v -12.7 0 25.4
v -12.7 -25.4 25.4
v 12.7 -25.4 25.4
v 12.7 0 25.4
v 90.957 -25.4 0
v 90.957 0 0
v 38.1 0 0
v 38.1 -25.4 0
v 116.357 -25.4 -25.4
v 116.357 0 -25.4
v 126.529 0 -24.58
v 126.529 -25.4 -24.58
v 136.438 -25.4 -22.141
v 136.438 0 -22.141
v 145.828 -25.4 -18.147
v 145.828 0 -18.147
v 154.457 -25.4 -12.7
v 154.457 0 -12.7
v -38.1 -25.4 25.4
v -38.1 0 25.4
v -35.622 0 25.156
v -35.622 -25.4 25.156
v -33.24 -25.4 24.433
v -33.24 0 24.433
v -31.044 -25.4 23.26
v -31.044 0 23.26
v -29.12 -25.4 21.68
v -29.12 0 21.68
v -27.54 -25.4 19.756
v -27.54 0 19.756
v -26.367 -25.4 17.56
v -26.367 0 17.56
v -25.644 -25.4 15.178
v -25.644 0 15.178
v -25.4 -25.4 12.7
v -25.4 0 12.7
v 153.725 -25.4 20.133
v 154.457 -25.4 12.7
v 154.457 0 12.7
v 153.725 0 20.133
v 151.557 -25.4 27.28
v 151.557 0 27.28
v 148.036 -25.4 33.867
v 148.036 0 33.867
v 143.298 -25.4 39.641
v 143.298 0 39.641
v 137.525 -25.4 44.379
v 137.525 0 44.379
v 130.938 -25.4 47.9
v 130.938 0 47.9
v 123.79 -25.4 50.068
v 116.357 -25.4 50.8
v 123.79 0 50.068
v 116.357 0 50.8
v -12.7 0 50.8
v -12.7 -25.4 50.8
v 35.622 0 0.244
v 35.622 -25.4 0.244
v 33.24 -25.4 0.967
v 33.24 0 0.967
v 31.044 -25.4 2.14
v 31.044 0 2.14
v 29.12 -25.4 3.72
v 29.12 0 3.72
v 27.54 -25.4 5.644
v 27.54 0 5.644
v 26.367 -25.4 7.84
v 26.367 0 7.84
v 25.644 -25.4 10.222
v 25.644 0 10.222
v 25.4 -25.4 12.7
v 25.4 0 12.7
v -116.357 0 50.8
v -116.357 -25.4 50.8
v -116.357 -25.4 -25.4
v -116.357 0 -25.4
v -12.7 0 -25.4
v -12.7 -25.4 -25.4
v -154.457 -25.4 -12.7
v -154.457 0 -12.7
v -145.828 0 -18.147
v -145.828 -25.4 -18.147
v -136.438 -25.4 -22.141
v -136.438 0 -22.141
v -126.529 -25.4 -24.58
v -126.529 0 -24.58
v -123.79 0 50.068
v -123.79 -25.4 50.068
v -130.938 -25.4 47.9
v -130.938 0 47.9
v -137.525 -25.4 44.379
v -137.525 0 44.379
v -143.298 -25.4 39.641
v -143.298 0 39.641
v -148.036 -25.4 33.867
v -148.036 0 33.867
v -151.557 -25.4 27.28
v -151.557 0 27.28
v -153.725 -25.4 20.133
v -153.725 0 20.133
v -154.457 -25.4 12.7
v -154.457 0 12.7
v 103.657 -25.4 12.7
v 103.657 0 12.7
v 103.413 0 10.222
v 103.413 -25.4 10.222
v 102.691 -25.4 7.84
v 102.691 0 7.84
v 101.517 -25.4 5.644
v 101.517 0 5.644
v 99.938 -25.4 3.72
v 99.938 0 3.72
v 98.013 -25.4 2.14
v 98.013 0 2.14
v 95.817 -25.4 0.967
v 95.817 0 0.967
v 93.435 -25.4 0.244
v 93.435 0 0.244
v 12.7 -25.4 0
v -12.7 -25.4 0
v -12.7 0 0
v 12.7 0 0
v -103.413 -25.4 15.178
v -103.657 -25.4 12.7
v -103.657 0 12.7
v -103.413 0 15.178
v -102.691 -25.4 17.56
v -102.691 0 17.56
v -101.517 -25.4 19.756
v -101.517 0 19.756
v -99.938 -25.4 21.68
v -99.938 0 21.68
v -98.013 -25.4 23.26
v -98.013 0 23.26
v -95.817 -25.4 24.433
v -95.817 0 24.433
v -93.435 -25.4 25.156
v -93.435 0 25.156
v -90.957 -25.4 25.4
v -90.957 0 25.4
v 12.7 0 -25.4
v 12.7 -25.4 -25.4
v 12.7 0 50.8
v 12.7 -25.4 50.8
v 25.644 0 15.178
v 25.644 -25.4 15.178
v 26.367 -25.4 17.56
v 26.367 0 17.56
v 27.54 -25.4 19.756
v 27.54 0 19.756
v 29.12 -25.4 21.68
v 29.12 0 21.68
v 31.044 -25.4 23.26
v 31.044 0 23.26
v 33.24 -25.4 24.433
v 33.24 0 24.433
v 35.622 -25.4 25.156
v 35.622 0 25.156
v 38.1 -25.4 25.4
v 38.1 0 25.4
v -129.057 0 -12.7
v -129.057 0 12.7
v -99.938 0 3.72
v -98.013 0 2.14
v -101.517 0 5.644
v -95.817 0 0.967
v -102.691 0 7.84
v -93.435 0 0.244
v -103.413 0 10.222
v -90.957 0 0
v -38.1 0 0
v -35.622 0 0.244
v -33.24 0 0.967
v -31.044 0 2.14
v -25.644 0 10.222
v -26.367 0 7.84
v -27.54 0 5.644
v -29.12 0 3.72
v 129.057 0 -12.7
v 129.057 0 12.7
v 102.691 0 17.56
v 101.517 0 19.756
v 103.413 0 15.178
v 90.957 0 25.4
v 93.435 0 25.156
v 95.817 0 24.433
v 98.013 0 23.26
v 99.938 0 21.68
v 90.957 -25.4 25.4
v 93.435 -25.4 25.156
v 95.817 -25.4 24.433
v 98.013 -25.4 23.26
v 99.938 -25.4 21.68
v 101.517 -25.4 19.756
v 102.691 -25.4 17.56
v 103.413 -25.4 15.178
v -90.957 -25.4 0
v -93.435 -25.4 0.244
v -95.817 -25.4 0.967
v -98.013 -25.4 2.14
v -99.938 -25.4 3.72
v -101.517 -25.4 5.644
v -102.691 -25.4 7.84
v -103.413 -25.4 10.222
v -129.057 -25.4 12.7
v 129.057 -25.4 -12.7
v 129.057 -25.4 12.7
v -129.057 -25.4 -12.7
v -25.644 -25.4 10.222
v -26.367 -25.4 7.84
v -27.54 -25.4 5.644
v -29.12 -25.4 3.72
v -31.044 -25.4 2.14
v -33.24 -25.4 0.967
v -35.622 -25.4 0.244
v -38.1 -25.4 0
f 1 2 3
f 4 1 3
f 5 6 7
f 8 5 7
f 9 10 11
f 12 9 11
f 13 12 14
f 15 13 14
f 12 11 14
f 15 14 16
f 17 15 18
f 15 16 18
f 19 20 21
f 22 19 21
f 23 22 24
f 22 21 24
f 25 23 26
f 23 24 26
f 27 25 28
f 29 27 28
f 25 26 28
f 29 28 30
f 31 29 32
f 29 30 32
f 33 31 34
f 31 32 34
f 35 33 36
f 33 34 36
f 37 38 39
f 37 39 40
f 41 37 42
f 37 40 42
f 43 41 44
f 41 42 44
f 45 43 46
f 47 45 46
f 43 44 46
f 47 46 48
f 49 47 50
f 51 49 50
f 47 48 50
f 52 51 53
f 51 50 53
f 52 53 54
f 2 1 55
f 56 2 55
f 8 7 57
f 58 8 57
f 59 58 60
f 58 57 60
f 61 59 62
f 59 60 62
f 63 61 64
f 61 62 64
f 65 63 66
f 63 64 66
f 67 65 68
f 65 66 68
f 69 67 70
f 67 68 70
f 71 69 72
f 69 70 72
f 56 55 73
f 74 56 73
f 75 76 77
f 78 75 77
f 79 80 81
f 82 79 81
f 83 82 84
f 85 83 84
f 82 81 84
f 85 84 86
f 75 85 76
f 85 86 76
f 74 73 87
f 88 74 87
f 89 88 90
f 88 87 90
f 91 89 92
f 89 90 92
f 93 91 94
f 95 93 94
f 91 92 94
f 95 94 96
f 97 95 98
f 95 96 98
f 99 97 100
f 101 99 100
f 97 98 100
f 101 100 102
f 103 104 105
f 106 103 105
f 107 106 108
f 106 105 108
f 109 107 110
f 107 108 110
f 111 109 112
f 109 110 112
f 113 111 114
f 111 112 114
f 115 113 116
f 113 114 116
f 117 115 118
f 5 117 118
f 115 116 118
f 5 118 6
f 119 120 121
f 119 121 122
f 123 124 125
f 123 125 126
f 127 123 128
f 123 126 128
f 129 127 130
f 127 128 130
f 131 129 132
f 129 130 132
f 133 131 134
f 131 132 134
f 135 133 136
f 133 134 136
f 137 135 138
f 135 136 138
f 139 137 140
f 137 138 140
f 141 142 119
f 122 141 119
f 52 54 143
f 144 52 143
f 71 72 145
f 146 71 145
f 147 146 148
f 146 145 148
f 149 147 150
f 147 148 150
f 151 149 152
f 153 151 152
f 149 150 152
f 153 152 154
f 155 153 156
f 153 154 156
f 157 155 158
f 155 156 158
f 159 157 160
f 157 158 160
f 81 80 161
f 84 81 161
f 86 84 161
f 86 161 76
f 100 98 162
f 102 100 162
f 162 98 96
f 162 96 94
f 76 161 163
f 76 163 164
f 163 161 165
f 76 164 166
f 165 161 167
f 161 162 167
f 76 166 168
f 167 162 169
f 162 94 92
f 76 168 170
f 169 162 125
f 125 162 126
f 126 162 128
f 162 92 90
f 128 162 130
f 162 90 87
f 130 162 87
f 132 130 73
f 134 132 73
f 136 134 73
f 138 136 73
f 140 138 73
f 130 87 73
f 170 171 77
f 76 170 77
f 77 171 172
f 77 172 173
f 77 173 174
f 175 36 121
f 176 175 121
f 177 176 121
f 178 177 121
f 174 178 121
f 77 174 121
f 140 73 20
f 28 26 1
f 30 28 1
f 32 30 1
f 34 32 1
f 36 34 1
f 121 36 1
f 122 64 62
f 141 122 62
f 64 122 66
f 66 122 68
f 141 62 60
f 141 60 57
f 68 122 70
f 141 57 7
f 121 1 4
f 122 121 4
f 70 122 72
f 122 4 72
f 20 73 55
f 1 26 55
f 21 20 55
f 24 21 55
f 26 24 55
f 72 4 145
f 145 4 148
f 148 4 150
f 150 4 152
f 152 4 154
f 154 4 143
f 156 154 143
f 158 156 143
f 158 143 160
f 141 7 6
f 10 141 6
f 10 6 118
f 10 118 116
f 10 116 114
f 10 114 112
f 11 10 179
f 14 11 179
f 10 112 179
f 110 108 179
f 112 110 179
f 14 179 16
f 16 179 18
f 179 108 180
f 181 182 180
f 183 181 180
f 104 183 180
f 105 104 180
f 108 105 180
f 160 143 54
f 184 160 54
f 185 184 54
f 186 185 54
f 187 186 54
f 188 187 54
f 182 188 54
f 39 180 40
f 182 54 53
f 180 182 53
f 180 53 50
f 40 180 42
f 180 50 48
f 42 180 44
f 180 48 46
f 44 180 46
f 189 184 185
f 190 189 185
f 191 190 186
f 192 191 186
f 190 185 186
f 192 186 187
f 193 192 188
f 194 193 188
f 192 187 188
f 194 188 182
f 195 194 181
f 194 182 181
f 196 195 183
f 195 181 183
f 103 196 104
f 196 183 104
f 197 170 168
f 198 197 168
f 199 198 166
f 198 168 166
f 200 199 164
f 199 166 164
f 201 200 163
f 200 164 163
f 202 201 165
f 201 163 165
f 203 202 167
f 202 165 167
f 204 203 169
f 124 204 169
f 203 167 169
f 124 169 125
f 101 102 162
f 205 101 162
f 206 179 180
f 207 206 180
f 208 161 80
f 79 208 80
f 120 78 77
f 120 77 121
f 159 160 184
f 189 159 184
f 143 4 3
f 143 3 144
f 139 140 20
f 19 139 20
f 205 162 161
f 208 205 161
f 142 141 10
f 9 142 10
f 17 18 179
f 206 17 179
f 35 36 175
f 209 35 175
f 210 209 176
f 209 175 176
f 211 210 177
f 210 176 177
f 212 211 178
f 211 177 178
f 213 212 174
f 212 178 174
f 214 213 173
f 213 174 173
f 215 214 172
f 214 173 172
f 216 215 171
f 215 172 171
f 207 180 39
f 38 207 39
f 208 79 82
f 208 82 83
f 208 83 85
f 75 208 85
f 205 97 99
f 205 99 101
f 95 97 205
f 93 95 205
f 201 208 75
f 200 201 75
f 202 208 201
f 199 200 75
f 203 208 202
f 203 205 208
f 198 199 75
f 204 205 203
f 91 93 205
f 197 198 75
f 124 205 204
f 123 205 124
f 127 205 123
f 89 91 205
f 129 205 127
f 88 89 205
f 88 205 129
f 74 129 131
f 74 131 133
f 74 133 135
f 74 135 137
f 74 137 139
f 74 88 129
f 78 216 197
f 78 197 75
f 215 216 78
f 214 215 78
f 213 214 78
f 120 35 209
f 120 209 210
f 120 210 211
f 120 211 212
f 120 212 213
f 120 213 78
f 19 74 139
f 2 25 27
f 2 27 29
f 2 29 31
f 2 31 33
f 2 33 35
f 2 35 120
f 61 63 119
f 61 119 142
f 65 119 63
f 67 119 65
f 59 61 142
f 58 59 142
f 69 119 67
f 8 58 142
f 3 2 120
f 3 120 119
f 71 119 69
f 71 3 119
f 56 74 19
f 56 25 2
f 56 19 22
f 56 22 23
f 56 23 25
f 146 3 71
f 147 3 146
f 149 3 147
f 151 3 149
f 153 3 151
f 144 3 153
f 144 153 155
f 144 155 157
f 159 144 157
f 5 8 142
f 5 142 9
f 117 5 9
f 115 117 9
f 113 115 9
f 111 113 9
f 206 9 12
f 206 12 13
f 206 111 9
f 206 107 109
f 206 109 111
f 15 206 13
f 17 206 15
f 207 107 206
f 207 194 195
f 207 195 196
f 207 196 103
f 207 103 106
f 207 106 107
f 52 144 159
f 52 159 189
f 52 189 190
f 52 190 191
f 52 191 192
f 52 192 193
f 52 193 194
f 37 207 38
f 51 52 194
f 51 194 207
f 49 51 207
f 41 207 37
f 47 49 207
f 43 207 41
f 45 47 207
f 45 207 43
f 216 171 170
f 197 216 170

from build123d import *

# Parameters (mm, degrees)
F1_DEPTH = 25.4
F2_W     = 25.4
F2_H     = 25.4
F3_DEPTH = 25.4


with BuildPart() as f1:
    # F0 (on Front) → F1 (new body)
    with BuildSketch(Plane.XZ):
        with BuildLine():
            Line((-154.4574, 12.7), (-129.0574, 12.7))
            Line((-129.0574, 12.7), (-129.0574, -12.7))
            Line((-129.0574, -12.7), (-154.4574, -12.7))
            ThreePointArc((-154.4574, -12.7), (-136.437863, -22.141389), (-116.3574, -25.4))
            Line((-116.3574, -25.4), (0, -25.4))
            Line((0, -25.4), (116.3574, -25.4))
            ThreePointArc((116.3574, -25.4), (136.437863, -22.141389), (154.4574, -12.7))
            Line((154.4574, -12.7), (129.0574, -12.7))
            Line((129.0574, -12.7), (129.0574, 12.7))
            Line((129.0574, 12.7), (154.4574, 12.7))
            ThreePointArc((154.4574, 12.7), (143.298168, 39.640768), (116.3574, 50.8))
            Line((116.3574, 50.8), (0, 50.8))
            Line((0, 50.8), (-116.3574, 50.8))
            ThreePointArc((-116.3574, 50.8), (-143.298168, 39.640768), (-154.4574, 12.7))
        make_face()
        with BuildLine():
            ThreePointArc((-103.6574, 12.7), (-99.937656, 21.680256), (-90.9574, 25.4))
            Line((-90.9574, 25.4), (-38.1, 25.4))
            ThreePointArc((-38.1, 25.4), (-29.119744, 21.680256), (-25.4, 12.7))
            ThreePointArc((-25.4, 12.7), (-29.119744, 3.719744), (-38.1, 0))
            Line((-38.1, 0), (-90.9574, 0))
            ThreePointArc((-90.9574, 0), (-99.937656, 3.719744), (-103.6574, 12.7))
        make_face(mode=Mode.SUBTRACT)
        with BuildLine():
            Line((38.1, 25.4), (90.9574, 25.4))
            ThreePointArc((90.9574, 25.4), (99.937656, 21.680256), (103.6574, 12.7))
            ThreePointArc((103.6574, 12.7), (99.937656, 3.719744), (90.9574, 0))
            Line((90.9574, 0), (38.1, 0))
            ThreePointArc((38.1, 0), (29.119744, 3.719744), (25.4, 12.7))
            ThreePointArc((25.4, 12.7), (29.119744, 21.680256), (38.1, 25.4))
        make_face(mode=Mode.SUBTRACT)
    extrude(amount=F1_DEPTH)

    # F2 (on face) → F3 (cut)
    with BuildSketch(Plane.XZ.offset(25.4)):
        with Locations((0, 38.1)):
            Rectangle(F2_W, F2_H)
        with Locations((0, -12.7)):
            Rectangle(F2_W, F2_H)
    extrude(amount=-F3_DEPTH, mode=Mode.SUBTRACT)


solid = f1.part
